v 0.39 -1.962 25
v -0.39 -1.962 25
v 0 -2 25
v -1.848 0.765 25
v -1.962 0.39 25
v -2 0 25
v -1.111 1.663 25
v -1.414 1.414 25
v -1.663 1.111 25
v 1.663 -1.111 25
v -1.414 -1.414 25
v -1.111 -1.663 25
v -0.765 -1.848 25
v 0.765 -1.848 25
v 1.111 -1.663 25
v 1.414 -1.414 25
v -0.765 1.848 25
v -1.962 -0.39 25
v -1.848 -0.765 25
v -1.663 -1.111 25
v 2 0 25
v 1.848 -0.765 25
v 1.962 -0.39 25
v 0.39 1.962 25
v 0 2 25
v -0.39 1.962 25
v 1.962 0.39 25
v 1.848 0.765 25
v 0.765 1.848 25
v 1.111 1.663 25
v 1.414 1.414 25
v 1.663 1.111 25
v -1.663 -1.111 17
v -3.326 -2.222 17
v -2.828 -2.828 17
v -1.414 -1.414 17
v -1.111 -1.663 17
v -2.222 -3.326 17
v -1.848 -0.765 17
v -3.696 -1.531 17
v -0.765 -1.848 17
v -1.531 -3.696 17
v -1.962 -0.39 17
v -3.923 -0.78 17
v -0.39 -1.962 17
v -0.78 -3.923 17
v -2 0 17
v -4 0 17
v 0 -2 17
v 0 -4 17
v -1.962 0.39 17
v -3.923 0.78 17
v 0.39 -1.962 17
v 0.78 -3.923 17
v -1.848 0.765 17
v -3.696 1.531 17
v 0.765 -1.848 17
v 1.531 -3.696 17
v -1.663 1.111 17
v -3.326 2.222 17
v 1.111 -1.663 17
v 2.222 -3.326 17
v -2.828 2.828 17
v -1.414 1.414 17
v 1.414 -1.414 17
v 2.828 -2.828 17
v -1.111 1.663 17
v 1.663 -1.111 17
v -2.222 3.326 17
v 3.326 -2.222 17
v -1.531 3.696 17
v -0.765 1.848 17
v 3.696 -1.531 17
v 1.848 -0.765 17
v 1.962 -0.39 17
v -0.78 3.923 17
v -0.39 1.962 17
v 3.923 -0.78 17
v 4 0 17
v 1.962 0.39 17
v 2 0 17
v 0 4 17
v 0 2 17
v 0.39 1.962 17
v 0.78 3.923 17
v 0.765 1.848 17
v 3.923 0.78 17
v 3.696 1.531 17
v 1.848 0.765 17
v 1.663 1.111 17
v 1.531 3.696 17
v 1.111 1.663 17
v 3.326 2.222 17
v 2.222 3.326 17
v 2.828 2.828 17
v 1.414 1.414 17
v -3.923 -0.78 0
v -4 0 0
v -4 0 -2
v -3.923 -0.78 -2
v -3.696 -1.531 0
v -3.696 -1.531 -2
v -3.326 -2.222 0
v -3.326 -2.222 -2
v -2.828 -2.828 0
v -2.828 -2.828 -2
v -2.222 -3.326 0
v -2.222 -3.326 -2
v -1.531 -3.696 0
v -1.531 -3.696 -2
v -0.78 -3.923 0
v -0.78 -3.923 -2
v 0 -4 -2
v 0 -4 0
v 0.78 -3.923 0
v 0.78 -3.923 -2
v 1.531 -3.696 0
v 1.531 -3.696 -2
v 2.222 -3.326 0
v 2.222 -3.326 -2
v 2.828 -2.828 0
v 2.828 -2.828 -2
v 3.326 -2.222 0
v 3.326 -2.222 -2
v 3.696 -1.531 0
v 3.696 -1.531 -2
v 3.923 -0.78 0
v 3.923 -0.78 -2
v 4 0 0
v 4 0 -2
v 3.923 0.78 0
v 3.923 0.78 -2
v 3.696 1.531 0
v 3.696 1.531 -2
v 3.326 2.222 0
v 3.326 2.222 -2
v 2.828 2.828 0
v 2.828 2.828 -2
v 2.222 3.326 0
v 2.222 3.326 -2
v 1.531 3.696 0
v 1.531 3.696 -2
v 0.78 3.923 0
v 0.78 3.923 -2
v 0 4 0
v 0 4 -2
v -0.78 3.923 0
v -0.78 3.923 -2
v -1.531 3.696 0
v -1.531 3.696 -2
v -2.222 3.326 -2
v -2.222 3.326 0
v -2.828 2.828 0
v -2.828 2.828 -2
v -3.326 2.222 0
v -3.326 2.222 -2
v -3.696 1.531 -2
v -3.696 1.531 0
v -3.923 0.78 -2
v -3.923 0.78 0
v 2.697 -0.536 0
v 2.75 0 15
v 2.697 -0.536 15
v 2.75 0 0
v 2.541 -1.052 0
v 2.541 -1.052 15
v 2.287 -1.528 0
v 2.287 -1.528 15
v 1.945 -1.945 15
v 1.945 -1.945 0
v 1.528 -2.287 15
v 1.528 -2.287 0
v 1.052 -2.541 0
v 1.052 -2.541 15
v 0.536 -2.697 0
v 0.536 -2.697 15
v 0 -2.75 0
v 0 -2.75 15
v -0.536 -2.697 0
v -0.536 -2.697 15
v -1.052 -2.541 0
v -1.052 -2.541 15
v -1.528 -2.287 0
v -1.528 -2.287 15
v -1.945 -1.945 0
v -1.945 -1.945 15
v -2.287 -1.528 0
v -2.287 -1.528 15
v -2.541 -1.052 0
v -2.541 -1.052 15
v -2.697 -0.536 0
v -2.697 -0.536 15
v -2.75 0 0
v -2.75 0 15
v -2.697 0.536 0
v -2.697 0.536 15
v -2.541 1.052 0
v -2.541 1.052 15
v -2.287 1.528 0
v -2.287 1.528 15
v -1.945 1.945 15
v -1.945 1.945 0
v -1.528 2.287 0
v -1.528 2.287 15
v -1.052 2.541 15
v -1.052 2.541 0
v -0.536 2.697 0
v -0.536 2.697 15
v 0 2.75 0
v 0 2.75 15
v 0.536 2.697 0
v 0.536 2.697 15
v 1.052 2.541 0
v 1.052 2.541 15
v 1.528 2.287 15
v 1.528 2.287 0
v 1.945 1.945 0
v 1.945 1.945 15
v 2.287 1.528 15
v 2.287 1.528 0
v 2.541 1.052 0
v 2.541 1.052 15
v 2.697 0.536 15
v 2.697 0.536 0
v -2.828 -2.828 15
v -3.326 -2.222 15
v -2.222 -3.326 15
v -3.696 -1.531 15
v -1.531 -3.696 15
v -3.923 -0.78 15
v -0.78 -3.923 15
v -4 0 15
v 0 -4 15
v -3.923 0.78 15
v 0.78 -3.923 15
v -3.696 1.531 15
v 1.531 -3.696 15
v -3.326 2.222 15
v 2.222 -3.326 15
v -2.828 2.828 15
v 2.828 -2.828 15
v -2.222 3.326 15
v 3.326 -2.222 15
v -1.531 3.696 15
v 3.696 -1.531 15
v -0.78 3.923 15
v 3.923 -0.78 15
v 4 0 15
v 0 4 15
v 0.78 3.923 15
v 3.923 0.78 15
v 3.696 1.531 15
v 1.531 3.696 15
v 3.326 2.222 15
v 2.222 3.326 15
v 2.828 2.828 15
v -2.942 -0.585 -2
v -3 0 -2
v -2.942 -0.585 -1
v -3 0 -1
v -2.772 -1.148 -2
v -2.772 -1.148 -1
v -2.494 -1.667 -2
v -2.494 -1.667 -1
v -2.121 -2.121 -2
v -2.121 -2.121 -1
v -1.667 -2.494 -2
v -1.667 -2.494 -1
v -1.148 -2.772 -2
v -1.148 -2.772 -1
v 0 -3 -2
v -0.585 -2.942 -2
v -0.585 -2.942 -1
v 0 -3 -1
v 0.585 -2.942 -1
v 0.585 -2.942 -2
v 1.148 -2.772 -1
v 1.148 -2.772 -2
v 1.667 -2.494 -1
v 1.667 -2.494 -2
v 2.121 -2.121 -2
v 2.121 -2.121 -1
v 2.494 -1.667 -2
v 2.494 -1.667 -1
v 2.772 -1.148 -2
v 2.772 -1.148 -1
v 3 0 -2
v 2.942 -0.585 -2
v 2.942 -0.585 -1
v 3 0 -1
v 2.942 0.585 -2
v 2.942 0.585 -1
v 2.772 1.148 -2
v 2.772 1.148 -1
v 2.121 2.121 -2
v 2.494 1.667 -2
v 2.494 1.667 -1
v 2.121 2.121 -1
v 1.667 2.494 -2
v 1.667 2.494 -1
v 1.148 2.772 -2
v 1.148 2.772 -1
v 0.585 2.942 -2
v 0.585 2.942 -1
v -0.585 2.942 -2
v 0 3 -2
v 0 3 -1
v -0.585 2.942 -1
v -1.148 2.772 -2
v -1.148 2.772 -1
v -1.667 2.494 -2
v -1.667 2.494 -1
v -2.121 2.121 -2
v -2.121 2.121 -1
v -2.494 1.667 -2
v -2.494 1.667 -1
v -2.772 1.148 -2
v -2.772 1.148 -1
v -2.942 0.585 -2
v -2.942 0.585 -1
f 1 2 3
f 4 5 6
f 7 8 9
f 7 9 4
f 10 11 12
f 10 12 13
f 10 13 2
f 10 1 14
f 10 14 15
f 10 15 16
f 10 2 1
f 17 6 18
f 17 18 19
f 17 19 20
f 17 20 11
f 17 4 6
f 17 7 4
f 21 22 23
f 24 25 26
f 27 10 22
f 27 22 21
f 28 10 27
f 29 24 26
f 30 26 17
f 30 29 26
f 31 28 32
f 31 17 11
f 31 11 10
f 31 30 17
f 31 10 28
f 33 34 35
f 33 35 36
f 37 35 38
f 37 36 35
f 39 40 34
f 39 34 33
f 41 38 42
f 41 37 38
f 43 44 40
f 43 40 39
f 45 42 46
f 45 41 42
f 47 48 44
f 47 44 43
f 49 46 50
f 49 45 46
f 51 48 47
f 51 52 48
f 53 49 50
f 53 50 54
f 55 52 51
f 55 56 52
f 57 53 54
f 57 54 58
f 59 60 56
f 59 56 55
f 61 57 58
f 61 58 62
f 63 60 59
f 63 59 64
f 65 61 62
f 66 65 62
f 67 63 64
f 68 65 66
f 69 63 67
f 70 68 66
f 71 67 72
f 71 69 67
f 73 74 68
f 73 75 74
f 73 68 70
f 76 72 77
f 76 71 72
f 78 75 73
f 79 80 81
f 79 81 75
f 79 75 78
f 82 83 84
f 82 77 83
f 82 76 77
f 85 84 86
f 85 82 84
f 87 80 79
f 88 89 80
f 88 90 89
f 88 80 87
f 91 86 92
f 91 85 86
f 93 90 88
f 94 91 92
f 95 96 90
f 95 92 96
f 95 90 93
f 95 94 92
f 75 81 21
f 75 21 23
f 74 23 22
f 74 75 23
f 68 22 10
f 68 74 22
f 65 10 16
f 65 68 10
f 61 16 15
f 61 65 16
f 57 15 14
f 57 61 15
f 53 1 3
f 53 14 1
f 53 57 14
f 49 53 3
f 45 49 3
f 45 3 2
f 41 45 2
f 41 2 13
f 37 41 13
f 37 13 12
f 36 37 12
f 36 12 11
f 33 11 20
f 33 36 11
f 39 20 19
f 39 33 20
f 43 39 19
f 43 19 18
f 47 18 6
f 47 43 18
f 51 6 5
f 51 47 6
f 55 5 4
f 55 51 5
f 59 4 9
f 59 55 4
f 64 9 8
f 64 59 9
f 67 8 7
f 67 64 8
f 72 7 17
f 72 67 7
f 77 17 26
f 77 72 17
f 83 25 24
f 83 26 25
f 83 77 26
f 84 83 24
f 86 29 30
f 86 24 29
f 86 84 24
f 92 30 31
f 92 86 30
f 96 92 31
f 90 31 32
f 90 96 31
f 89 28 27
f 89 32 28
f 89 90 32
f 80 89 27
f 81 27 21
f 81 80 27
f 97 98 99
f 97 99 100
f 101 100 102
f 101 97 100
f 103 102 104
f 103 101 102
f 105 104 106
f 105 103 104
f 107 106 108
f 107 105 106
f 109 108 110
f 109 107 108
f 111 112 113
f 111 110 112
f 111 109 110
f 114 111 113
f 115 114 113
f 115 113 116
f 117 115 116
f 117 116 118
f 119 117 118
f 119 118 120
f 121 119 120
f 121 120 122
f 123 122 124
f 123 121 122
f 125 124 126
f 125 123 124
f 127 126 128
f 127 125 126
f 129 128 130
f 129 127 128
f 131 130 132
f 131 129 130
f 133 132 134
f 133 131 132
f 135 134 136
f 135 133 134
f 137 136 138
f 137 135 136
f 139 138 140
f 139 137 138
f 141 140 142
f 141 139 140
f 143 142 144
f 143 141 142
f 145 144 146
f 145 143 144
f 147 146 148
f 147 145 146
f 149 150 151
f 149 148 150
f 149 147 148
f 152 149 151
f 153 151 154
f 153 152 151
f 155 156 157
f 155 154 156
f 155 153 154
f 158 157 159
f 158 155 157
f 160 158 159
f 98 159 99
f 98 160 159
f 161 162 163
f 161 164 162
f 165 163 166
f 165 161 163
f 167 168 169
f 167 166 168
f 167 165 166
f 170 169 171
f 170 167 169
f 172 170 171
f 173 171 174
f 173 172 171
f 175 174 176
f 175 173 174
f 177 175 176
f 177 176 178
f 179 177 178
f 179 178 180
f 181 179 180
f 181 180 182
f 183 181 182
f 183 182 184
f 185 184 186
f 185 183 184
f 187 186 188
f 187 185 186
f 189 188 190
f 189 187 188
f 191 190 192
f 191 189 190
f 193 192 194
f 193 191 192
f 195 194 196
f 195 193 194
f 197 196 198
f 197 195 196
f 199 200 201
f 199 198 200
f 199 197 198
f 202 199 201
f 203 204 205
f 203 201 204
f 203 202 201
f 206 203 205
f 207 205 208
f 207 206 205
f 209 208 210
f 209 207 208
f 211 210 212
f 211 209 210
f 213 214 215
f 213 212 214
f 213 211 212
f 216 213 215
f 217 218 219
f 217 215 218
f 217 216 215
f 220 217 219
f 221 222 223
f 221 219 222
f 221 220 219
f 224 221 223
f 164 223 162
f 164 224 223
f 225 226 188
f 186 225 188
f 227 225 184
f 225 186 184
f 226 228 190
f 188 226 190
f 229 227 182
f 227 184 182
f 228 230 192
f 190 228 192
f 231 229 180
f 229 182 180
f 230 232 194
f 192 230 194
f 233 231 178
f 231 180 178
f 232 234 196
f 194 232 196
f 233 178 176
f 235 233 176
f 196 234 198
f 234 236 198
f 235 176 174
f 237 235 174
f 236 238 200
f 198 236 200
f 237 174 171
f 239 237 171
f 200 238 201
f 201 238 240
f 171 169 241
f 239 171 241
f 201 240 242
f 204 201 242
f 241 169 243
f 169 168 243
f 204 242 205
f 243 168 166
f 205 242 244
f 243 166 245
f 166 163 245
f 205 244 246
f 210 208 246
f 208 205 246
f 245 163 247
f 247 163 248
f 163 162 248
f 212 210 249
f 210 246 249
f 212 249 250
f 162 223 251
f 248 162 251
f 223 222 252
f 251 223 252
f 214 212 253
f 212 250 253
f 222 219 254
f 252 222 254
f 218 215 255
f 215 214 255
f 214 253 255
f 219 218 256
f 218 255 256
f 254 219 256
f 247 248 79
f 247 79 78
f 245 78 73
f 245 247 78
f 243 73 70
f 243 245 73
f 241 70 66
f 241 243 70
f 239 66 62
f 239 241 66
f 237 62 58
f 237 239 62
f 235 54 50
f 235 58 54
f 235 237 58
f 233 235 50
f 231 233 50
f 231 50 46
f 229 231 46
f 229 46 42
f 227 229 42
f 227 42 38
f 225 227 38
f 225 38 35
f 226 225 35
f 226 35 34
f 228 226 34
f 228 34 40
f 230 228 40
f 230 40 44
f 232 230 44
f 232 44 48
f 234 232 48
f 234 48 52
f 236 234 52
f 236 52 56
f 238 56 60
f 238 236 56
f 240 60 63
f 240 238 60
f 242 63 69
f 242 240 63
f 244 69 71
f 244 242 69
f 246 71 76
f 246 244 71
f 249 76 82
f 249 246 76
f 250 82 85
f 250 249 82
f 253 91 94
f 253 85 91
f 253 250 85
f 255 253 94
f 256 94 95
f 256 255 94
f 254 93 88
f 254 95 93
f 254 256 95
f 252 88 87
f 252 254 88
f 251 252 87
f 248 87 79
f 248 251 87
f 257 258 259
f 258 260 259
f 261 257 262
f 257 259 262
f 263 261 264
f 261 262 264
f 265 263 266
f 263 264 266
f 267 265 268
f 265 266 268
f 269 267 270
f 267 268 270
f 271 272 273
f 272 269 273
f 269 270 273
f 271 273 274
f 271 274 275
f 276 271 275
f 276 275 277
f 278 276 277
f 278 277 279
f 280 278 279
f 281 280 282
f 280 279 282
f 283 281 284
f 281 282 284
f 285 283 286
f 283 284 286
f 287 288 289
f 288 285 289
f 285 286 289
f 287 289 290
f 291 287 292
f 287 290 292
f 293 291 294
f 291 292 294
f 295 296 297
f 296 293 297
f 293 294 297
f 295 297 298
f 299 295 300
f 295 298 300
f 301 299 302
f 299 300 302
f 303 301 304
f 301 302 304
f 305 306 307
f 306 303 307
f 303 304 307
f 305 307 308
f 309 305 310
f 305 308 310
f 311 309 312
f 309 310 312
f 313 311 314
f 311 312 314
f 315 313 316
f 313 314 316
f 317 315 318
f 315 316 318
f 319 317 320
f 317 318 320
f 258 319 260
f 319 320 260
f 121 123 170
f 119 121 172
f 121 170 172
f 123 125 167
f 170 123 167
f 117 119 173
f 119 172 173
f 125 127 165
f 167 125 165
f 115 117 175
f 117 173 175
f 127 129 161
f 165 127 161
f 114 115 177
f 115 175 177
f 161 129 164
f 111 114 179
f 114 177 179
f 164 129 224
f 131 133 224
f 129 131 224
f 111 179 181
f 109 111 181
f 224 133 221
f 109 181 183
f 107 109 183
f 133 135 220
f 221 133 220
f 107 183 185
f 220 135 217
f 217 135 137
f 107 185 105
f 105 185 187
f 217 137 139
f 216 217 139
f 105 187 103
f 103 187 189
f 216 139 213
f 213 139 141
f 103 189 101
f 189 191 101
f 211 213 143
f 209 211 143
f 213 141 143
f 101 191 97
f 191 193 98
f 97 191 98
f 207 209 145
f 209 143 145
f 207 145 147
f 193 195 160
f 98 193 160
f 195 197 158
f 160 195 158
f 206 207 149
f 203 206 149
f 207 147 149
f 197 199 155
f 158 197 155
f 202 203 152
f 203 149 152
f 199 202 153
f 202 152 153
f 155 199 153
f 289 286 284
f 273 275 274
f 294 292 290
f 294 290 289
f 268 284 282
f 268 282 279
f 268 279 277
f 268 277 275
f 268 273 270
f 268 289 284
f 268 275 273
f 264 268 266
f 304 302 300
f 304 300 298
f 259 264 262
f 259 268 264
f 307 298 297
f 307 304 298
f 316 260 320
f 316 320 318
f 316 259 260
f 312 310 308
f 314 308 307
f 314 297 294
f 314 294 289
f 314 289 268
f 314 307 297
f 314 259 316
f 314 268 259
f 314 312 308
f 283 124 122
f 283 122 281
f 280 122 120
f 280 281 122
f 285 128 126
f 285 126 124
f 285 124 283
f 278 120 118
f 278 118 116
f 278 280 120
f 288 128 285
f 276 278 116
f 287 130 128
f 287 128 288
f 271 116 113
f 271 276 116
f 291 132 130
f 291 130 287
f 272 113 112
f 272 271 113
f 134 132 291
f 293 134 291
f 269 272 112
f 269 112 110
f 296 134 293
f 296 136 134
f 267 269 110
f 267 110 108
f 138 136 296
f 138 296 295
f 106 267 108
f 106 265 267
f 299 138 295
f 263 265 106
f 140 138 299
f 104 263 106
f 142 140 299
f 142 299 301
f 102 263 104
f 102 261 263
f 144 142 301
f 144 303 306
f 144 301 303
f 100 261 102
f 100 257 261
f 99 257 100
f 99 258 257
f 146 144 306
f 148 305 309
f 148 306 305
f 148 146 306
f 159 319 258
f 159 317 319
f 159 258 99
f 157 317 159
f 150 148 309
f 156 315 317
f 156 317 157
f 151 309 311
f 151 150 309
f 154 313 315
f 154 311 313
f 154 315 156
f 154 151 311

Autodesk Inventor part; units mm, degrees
ref_plane "YZ Plane" through (0, 0, 0) normal (1, 0, 0) x (0, 1, 0)
ref_plane "XZ Plane" through (0, 0, 0) normal (0, 1, 0) x (-1, 0, 0)
ref_plane "XY Plane" through (0, 0, 0) normal (0, 0, 1) x (1, 0, 0)
sketch "Эскиз1" plane through (0, 0, 0) normal (0, 0, 1) x (1, 0, 0)
  circle A0 centre (0, 0) radius 2.75 projected
extrude "Выдавливание1" add sketch "Эскиз1" along normal blind 15
sketch "Эскиз2" plane through (0, 0, 15) normal (0, 0, 1) x (1, 0, 0)
  circle A0 centre (0, 0) radius 2.75 projected
  circle A1 centre (0, 0) radius 4
  dimension "d2" = 8
extrude "Выдавливание2" add sketch "Эскиз2" along normal blind 2 contours A0 | A1
sketch "Эскиз3" plane through (0, 0, 17) normal (0, 0, 1) x (1, 0, 0)
  circle A0 centre (0, 0) radius 2.75 projected
  circle A1 centre (0, 0) radius 2
  dimension "d5" = 4
  dimension "d6" = 5.5
extrude "Выдавливание3" add sketch "Эскиз3" along normal blind 8 contours A1
sketch "Эскиз4" plane through (0, 0, 0) normal (0, 0, -1) x (-1, 0, 0)
  circle A0 centre (0, 0) radius 4
extrude "Выдавливание4" add sketch "Эскиз4" along normal blind 1
sketch "Эскиз5" plane through (0, 0, -1) normal (0, 0, -1) x (-1, 0, 0)
  circle A0 centre (0, 0) radius 4 projected
  circle A1 centre (0, 0) radius 3
  dimension "d11" = 6
extrude "Выдавливание5" add sketch "Эскиз5" along normal blind 1
properties part number "butt"
